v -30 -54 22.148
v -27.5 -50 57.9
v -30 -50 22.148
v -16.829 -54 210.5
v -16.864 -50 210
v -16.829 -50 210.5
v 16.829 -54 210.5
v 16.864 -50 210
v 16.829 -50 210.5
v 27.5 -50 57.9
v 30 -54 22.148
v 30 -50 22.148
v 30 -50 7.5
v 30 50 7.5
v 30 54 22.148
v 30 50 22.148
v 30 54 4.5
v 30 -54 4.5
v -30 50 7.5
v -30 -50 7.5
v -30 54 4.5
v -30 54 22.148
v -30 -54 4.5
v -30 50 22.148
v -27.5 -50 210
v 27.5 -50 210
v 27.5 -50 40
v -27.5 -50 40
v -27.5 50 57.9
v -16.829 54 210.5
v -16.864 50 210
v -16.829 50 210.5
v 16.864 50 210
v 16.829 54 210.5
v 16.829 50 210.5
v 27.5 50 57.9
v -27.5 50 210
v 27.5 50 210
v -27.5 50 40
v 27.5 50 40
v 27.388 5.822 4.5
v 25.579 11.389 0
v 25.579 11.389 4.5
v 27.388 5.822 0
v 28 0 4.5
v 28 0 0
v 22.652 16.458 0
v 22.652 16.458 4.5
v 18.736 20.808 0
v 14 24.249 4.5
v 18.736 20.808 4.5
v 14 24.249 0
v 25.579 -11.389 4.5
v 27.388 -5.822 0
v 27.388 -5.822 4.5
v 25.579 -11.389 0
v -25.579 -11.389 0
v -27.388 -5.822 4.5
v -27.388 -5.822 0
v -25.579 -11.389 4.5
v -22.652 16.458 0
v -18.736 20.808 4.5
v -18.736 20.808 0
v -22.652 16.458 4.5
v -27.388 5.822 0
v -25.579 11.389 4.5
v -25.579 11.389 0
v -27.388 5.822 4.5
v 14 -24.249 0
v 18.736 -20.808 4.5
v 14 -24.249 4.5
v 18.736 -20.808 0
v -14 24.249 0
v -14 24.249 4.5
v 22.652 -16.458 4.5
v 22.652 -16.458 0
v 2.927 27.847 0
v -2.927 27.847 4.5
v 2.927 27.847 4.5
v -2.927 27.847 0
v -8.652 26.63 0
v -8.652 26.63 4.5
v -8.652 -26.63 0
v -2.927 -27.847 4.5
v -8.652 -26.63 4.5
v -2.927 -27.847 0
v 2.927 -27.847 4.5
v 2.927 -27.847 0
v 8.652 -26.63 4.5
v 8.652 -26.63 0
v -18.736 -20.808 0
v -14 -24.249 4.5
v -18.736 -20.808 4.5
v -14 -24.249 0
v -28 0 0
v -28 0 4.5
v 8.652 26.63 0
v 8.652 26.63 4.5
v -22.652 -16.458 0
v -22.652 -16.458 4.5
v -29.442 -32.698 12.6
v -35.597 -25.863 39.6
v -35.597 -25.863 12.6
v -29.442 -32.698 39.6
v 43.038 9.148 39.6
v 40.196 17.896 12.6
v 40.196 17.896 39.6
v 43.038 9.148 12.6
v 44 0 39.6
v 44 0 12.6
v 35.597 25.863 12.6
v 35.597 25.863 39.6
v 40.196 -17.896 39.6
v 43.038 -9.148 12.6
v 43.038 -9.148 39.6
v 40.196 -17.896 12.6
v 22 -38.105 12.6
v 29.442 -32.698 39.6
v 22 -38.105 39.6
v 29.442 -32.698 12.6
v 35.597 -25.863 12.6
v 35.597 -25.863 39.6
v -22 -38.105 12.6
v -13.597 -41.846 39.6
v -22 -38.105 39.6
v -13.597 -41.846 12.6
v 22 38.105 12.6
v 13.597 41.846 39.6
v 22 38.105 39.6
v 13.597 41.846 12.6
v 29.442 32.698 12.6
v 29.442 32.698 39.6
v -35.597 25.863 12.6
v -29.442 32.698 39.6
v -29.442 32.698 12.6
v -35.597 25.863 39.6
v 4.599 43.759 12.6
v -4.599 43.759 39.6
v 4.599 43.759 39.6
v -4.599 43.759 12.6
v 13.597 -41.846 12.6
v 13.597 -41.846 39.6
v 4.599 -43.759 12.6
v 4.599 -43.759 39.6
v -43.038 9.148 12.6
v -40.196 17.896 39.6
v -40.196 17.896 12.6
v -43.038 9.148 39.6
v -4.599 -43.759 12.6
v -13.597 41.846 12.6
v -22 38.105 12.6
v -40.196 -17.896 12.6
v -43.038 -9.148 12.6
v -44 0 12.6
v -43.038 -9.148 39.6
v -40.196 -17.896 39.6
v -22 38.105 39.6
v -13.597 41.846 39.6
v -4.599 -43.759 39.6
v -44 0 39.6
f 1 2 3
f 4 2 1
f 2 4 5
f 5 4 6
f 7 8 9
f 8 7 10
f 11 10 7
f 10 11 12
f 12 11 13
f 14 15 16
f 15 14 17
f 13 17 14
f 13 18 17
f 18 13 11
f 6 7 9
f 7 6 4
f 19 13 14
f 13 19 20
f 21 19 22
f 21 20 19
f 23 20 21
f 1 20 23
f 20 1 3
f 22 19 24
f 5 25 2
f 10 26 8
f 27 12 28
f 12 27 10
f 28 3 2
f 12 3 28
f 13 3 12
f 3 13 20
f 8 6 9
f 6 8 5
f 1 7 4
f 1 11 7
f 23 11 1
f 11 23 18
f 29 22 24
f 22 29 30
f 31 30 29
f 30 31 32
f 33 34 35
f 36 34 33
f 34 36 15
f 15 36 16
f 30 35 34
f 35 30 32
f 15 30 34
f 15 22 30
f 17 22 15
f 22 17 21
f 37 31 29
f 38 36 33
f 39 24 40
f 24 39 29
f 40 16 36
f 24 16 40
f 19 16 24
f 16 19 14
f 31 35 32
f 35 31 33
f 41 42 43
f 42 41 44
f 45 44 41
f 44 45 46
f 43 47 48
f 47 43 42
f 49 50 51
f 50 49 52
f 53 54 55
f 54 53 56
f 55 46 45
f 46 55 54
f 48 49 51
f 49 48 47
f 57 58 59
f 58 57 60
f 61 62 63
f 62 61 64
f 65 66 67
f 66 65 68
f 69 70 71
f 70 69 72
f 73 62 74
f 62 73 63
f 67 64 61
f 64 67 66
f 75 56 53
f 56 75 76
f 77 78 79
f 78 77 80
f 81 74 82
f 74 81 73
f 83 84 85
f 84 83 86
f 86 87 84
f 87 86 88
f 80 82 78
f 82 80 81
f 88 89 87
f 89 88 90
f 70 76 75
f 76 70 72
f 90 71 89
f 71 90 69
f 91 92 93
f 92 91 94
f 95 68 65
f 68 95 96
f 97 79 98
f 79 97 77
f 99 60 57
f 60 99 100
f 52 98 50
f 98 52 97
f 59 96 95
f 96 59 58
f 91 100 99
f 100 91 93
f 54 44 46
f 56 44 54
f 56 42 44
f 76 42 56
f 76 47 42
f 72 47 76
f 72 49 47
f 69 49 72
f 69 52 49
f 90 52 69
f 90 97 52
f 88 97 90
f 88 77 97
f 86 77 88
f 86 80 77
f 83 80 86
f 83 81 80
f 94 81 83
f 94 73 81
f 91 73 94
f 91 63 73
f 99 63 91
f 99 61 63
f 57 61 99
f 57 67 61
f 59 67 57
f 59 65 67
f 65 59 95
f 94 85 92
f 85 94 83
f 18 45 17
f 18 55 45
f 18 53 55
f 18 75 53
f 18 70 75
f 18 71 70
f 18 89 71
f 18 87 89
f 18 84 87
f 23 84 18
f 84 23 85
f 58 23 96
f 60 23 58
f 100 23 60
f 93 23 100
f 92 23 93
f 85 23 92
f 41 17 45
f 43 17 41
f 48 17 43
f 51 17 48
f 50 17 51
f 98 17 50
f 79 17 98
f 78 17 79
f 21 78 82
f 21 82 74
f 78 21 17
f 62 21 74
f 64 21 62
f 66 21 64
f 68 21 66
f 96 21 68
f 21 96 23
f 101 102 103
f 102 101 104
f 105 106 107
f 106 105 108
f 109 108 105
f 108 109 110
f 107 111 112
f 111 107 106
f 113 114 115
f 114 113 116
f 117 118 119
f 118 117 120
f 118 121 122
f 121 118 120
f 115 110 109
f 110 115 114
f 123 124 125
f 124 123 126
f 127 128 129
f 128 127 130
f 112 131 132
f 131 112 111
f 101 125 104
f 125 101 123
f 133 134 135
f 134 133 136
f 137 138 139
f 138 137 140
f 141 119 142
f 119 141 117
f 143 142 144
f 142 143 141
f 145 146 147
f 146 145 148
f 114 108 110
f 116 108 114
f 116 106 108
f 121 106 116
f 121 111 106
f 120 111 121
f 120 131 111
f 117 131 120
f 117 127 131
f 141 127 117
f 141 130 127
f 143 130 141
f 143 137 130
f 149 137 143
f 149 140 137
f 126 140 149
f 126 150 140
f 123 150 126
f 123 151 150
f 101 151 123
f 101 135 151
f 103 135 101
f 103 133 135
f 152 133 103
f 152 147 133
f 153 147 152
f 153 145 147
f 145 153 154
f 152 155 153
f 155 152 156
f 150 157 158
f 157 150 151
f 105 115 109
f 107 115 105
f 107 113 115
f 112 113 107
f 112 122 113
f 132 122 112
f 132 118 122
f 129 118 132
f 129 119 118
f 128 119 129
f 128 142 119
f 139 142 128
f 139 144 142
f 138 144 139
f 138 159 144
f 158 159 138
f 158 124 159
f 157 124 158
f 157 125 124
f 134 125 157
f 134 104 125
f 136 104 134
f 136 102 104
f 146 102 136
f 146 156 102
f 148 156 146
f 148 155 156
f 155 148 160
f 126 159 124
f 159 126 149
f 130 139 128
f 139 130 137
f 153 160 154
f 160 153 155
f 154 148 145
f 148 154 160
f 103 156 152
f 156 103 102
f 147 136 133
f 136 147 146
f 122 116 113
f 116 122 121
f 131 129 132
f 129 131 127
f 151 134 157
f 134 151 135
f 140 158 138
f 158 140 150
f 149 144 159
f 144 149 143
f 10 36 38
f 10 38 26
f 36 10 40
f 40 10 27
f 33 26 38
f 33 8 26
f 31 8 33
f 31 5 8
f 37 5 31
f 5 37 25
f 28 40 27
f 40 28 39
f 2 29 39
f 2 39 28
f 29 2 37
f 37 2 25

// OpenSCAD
// === STL Reference ===
// %scale(1000) import("j6.stl");

// === Wrist Connector ===
wrist_radius = 28;
wrist_thickness = 4.6;

cylinder(r = wrist_radius, h = wrist_thickness);

// === Angle Bracket Plate ===
plate_width   = 60;
plate_height  = 108;
plate_depth   = 3;
plate_z_pos   = wrist_thickness + 1.4;  // Slight gap above connector

translate([0, 0, plate_z_pos])
    cube([plate_width, plate_height, plate_depth], center = true);

// === Upright Arms of Angle Bracket (Left and Right) ===
bracket_arm_width   = 60;
bracket_arm_depth   = 4;
bracket_arm_height  = 203;
bracket_arm_z_pos   = 6 + 103;

cut_angle_deg       = 4;
cut_box_width       = 60;
cut_box_depth       = 5;
cut_box_height      = 210;
cut_offset_x        = 54;

for (side = [-1, 1]) {
    translate([0, side * ((plate_height / 2) - 2), bracket_arm_z_pos])
        difference() {
            cube([bracket_arm_width, bracket_arm_depth, bracket_arm_height], center = true);

            for (cut_side = [-1, 1]) {
                translate([cut_side * cut_offset_x, 0, 0])
                    rotate([0, cut_side * -cut_angle_deg, 0])
                        cube([cut_box_width, cut_box_depth, cut_box_height], center = true);
            }
        }
}

// === J6 Housing ===
housing_radius = 44;
housing_height = 27;
housing_z_pos  = wrist_thickness + plate_depth + 5;

translate([0, 0, housing_z_pos])
    cylinder(r = housing_radius, h = housing_height);

// === J6 Block Body ===
block_width  = 55;
block_depth  = 100;
block_height = 170;
block_z_pos  = 125;

translate([0, 0, block_z_pos])
    cube([block_width, block_depth, block_height], center = true);
